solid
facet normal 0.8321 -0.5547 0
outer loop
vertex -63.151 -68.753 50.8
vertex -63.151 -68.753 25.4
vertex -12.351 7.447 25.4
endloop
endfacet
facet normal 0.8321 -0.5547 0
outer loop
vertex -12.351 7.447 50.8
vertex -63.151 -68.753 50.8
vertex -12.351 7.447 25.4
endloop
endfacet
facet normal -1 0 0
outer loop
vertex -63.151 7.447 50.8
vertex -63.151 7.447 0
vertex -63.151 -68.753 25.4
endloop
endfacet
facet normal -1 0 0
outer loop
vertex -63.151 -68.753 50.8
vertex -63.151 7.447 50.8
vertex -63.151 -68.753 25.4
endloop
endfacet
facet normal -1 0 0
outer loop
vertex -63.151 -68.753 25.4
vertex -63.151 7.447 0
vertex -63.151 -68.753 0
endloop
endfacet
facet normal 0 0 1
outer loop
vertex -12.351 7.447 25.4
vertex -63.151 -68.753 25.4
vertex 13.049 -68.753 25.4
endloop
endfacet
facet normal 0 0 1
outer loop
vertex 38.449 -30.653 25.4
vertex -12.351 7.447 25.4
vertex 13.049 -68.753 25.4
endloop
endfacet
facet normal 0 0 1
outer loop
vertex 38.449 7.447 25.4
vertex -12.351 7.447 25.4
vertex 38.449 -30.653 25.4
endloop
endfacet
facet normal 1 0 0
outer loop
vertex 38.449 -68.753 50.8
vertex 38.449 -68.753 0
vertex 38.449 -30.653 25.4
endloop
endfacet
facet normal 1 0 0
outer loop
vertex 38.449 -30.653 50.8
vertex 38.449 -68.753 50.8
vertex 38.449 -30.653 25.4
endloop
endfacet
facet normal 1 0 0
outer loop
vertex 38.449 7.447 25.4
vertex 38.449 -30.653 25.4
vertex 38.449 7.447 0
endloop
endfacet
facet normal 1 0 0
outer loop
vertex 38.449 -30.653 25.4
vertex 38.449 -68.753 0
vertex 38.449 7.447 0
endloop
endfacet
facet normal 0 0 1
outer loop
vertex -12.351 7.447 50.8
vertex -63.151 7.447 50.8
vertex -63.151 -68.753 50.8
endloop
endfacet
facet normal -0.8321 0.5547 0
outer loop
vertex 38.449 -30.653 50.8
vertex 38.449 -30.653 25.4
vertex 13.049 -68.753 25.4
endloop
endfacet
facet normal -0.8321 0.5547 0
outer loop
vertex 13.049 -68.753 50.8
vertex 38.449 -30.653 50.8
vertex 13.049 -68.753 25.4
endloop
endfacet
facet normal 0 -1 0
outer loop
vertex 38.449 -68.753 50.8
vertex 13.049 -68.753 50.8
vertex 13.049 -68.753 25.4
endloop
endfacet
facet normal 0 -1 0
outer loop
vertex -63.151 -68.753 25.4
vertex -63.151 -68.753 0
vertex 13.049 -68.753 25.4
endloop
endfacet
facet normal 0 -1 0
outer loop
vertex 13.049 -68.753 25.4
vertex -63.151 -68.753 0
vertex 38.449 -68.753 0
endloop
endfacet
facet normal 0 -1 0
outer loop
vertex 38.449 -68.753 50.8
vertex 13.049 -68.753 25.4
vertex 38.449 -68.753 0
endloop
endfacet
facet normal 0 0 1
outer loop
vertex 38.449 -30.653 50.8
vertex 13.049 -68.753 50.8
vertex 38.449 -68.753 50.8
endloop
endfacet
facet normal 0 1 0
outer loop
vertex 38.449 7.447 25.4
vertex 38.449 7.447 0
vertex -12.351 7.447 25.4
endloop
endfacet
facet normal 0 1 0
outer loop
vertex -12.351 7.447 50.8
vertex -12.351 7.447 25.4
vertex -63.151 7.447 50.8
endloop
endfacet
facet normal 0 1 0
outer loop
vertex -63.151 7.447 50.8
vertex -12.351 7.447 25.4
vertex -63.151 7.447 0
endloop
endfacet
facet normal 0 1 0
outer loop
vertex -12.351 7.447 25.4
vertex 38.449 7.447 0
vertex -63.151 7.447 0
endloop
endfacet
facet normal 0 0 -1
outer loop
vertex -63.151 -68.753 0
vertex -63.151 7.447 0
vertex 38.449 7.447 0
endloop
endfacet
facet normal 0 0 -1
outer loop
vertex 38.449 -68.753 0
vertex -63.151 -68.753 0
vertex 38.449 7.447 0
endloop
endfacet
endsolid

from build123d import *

# Parameters (mm, degrees)
F0_W     = 101.6
F0_H     = 76.2
F1_DEPTH = 25.4
F3_DEPTH = 25.4
F5_DEPTH = 25.4


with BuildPart() as f1:
    # F0 (on Top) → F1 (new body)
    with BuildSketch(Plane.XY):
        with Locations((-12.35143, -30.653376)):
            Rectangle(F0_W, F0_H)
    extrude(amount=F1_DEPTH)

    # F2 (on face) → F3 (join)
    with BuildSketch(Plane.XY.offset(25.4)):
        Polygon((-63.15143, -68.753376), (-12.35143, 7.446624), (-63.15143, 7.446624), align=None)
    extrude(amount=F3_DEPTH)

    # F4 (on face) → F5 (join)
    with BuildSketch(Plane.XY.offset(25.4)):
        Polygon((38.44857, -30.653376), (13.04857, -68.753376), (38.44857, -68.753376), align=None)
    extrude(amount=F5_DEPTH)


solid = f1.part
